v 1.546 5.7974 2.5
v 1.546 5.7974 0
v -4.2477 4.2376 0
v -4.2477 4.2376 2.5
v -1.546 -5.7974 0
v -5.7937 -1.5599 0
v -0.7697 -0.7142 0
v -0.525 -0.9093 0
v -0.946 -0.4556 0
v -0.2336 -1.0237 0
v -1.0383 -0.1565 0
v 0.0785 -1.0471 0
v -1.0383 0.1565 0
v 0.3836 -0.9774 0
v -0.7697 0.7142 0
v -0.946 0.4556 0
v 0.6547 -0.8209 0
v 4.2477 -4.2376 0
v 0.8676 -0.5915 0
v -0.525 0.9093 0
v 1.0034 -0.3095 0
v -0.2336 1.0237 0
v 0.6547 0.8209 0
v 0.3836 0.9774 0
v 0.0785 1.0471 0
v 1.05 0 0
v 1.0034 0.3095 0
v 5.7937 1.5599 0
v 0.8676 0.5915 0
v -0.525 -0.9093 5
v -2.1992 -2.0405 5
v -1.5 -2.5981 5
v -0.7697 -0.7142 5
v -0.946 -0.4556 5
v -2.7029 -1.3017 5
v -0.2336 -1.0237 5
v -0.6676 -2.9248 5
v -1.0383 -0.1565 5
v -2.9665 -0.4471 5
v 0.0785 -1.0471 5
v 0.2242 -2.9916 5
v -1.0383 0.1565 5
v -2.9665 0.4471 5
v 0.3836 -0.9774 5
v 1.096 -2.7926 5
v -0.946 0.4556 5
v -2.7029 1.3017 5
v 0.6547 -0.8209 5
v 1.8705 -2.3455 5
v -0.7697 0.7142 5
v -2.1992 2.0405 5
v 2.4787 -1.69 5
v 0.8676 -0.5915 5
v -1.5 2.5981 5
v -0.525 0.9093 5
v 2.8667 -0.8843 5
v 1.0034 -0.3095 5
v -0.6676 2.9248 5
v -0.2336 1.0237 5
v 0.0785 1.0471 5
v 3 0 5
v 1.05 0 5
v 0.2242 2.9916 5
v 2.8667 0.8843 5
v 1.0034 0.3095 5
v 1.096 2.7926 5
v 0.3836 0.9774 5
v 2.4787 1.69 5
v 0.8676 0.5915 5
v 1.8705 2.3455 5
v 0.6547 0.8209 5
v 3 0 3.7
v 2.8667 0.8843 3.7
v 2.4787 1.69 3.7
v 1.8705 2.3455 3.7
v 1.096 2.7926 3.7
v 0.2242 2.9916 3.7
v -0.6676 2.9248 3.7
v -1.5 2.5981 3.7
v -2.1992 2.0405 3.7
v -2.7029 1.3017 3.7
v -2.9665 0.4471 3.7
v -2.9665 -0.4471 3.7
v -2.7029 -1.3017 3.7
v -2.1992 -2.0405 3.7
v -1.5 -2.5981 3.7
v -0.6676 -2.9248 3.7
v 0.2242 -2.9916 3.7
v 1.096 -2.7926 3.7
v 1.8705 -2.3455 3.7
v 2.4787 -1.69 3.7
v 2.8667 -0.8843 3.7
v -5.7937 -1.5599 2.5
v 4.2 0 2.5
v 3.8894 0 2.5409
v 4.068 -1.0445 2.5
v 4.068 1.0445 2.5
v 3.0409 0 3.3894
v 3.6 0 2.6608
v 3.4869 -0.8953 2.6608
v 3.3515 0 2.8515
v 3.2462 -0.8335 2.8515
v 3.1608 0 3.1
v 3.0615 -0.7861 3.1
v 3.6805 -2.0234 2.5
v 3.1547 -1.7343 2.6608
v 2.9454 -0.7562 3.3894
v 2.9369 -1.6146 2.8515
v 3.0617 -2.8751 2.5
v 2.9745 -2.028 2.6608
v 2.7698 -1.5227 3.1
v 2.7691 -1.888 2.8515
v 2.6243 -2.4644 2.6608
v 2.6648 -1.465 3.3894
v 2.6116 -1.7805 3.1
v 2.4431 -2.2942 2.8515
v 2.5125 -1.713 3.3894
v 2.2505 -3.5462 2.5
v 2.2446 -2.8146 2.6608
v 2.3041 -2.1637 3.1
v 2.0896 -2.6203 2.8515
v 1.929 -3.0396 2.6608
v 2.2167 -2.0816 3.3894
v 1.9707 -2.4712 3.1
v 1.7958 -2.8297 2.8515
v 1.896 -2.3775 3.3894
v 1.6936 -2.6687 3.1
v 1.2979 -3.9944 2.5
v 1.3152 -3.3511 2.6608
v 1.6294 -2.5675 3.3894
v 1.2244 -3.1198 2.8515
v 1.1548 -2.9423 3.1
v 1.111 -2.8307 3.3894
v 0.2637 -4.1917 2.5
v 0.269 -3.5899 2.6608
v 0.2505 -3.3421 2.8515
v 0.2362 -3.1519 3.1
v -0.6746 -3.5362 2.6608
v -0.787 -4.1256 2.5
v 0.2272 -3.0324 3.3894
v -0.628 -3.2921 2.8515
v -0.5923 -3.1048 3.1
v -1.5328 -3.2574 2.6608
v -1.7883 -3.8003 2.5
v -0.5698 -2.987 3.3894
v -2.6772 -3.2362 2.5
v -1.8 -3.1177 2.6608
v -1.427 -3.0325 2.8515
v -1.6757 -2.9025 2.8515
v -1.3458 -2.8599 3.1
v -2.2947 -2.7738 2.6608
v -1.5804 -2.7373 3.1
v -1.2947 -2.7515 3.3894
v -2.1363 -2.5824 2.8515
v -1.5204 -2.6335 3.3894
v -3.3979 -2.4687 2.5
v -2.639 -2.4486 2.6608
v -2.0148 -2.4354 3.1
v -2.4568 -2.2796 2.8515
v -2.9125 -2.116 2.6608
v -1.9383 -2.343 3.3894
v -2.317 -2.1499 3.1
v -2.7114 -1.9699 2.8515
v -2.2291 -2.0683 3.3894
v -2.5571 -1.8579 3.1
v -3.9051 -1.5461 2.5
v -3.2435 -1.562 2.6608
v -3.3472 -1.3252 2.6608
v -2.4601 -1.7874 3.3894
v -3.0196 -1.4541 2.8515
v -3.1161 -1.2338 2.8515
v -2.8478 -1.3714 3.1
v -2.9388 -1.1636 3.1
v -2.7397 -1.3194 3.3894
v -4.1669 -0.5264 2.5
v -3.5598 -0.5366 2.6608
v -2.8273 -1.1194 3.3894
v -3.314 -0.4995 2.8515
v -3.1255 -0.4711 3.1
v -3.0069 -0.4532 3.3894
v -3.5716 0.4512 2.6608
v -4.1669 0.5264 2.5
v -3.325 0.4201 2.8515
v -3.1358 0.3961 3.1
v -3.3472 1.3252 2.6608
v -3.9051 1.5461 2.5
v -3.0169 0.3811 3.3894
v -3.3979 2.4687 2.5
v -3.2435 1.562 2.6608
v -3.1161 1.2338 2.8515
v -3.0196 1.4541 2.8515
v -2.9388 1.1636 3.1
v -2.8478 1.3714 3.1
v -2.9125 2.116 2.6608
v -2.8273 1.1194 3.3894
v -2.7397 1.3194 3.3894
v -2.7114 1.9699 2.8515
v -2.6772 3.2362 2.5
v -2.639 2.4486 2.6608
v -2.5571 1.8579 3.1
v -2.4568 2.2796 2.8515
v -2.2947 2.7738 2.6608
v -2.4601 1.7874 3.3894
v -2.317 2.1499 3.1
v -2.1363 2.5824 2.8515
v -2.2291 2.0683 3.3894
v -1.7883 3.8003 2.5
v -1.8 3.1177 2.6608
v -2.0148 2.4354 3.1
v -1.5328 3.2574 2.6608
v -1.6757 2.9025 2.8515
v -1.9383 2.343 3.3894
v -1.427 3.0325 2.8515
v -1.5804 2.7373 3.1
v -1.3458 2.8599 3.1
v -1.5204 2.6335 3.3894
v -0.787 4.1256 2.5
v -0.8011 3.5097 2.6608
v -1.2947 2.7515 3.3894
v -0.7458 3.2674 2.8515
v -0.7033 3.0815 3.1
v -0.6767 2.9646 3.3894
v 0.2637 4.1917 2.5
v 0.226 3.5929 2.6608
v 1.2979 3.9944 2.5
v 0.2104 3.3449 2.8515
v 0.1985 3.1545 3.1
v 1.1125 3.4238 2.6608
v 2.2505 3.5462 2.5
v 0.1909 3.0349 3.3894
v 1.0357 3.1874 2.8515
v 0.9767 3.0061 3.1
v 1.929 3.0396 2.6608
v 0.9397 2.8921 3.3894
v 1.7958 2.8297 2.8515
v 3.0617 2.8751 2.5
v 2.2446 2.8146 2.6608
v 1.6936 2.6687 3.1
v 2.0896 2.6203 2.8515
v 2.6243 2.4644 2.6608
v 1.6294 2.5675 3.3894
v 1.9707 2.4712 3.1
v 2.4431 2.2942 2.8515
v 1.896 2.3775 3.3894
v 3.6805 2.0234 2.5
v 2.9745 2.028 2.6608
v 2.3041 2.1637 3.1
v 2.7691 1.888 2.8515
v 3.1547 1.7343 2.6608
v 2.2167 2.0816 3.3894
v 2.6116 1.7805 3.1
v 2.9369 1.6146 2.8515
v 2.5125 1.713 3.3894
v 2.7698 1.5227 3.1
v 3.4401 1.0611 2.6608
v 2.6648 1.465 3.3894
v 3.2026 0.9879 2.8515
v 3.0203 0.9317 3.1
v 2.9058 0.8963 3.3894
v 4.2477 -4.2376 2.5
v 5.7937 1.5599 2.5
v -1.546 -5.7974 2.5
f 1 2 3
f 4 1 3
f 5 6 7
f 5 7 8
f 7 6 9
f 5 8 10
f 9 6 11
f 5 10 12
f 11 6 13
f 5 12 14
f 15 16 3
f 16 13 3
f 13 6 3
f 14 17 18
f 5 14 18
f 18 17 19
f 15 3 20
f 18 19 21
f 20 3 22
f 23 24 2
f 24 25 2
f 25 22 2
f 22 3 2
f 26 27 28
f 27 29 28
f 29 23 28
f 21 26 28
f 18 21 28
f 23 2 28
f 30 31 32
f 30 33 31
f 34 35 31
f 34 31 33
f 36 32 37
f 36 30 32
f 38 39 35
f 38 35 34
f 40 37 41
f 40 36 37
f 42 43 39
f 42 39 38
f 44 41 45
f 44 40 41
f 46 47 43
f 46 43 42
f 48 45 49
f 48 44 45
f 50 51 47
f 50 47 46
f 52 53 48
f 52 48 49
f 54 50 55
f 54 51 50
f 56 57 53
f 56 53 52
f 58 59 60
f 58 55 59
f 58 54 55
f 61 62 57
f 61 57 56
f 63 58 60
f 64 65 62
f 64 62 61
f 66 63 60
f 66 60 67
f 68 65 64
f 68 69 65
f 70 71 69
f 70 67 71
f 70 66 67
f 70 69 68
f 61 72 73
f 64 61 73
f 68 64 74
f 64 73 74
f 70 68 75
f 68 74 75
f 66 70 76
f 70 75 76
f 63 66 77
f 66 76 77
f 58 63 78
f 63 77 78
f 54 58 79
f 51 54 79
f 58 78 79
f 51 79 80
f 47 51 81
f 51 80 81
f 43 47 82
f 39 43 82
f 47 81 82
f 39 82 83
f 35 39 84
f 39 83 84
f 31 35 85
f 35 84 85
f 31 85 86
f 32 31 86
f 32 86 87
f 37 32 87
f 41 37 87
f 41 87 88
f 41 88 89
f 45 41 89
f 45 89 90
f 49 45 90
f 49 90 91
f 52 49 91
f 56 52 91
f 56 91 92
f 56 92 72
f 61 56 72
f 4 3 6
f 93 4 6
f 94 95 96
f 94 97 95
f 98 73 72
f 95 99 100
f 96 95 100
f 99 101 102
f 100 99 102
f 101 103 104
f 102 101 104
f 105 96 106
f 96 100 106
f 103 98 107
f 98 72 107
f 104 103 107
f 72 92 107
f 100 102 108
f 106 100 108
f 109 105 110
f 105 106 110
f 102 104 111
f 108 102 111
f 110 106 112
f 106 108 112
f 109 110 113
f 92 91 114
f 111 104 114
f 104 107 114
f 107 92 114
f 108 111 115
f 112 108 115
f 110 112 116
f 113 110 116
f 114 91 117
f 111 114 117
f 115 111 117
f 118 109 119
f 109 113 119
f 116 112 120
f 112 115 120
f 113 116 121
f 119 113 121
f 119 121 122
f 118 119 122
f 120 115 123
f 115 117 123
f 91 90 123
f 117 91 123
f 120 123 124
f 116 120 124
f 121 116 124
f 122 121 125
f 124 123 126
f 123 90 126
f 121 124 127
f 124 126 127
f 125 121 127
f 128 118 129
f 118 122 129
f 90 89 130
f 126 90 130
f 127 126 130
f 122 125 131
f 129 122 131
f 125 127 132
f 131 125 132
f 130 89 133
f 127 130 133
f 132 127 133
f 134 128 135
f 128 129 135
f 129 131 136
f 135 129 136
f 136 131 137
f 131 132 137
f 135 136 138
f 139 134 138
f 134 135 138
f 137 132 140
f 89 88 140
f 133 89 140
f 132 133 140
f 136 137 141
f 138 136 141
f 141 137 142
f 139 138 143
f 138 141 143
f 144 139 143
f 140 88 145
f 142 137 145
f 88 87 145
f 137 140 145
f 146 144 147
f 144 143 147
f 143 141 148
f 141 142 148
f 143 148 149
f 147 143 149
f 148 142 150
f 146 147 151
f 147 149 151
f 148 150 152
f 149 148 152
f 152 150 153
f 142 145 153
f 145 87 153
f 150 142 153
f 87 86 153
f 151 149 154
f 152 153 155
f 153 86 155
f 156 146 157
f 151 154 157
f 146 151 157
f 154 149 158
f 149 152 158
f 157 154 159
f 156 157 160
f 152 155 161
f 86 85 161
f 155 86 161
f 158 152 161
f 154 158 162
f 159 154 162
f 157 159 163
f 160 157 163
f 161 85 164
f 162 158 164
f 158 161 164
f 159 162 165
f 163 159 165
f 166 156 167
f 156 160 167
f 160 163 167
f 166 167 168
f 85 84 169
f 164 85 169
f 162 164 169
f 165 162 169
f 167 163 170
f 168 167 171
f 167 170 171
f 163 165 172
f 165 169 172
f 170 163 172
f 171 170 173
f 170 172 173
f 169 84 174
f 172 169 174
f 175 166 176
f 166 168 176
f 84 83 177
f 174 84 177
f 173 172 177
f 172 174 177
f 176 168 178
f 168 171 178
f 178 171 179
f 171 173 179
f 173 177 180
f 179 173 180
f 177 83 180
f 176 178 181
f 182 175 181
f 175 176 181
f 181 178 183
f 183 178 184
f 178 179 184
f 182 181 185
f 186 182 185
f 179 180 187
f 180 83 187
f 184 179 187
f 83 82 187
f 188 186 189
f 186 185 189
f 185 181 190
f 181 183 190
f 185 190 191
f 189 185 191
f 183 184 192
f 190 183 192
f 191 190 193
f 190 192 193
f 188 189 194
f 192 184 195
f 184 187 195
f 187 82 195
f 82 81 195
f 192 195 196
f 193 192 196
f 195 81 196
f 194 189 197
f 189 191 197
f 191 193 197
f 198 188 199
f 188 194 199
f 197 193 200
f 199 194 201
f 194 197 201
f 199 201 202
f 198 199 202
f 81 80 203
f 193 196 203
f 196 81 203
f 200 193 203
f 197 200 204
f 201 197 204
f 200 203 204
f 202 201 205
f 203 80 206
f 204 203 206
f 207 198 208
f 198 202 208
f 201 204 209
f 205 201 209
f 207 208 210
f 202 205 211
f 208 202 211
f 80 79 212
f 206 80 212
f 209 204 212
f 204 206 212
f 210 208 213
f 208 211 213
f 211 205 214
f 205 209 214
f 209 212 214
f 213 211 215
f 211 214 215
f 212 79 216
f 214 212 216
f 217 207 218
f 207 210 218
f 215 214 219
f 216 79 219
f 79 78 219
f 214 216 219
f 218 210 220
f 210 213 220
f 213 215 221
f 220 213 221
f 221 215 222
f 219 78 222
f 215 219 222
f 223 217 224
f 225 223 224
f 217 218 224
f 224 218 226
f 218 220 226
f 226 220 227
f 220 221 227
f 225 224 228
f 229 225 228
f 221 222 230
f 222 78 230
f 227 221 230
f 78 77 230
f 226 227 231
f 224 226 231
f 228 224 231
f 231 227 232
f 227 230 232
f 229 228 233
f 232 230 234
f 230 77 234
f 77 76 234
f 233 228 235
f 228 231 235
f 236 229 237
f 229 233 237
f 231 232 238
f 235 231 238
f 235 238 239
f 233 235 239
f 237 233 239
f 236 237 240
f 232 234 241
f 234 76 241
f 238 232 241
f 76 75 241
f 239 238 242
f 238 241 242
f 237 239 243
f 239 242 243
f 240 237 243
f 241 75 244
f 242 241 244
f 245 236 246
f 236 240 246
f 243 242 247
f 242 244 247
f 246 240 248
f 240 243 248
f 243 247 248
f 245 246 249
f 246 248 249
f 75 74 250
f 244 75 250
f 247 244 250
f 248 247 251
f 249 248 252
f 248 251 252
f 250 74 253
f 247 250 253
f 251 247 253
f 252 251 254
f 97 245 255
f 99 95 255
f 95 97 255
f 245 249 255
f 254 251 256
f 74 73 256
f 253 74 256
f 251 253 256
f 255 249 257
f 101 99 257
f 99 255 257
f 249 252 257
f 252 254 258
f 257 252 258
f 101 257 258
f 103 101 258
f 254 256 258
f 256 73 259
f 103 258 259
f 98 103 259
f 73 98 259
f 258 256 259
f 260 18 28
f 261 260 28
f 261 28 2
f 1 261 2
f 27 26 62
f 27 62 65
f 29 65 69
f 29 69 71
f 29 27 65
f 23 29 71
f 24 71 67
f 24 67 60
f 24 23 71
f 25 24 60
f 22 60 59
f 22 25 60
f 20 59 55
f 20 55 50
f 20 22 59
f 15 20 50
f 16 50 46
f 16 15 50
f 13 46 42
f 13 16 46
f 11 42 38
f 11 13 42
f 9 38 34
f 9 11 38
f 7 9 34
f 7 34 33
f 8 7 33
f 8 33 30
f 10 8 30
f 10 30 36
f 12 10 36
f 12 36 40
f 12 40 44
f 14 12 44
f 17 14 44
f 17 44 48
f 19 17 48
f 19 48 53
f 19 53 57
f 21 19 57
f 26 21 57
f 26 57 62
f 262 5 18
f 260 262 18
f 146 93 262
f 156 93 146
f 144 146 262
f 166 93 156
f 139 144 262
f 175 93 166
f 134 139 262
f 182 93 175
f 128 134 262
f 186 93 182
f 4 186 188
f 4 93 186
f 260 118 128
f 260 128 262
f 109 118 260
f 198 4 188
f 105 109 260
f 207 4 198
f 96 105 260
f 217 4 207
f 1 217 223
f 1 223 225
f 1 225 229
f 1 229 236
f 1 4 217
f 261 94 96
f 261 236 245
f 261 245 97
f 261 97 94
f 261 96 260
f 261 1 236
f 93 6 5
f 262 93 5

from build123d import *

# Parameters (mm, degrees)
F0_R     = 3
F0_R_2   = 1.05
F1_DEPTH = 2.5
F2_DEPTH = 5
F3_R     = 1.2


with BuildPart() as f1:
    # F0 (on Top) → F1 (new body)
    with BuildSketch(Plane.XY):
        Polygon((1.545967, 5.797412), (-4.247722, 4.237553), (-5.79369, -1.559859), (-1.545967, -5.797412), (4.247722, -4.237553), (5.79369, 1.559859), align=None)
        Circle(F0_R, mode=Mode.SUBTRACT)
        Circle(F0_R)
        Circle(F0_R_2, mode=Mode.SUBTRACT)
    extrude(amount=F1_DEPTH)

    # F0 (on Top) → F2 (join)
    with BuildSketch(Plane.XY):
        Circle(F0_R)
        Circle(F0_R_2, mode=Mode.SUBTRACT)
    extrude(amount=F2_DEPTH)

    # F3
    f3_edges = [f1.edges().sort_by_distance(p)[0] for p in [
        (-3, 0, 2.5),
    ]]
    fillet(f3_edges, radius=F3_R)


solid = f1.part
